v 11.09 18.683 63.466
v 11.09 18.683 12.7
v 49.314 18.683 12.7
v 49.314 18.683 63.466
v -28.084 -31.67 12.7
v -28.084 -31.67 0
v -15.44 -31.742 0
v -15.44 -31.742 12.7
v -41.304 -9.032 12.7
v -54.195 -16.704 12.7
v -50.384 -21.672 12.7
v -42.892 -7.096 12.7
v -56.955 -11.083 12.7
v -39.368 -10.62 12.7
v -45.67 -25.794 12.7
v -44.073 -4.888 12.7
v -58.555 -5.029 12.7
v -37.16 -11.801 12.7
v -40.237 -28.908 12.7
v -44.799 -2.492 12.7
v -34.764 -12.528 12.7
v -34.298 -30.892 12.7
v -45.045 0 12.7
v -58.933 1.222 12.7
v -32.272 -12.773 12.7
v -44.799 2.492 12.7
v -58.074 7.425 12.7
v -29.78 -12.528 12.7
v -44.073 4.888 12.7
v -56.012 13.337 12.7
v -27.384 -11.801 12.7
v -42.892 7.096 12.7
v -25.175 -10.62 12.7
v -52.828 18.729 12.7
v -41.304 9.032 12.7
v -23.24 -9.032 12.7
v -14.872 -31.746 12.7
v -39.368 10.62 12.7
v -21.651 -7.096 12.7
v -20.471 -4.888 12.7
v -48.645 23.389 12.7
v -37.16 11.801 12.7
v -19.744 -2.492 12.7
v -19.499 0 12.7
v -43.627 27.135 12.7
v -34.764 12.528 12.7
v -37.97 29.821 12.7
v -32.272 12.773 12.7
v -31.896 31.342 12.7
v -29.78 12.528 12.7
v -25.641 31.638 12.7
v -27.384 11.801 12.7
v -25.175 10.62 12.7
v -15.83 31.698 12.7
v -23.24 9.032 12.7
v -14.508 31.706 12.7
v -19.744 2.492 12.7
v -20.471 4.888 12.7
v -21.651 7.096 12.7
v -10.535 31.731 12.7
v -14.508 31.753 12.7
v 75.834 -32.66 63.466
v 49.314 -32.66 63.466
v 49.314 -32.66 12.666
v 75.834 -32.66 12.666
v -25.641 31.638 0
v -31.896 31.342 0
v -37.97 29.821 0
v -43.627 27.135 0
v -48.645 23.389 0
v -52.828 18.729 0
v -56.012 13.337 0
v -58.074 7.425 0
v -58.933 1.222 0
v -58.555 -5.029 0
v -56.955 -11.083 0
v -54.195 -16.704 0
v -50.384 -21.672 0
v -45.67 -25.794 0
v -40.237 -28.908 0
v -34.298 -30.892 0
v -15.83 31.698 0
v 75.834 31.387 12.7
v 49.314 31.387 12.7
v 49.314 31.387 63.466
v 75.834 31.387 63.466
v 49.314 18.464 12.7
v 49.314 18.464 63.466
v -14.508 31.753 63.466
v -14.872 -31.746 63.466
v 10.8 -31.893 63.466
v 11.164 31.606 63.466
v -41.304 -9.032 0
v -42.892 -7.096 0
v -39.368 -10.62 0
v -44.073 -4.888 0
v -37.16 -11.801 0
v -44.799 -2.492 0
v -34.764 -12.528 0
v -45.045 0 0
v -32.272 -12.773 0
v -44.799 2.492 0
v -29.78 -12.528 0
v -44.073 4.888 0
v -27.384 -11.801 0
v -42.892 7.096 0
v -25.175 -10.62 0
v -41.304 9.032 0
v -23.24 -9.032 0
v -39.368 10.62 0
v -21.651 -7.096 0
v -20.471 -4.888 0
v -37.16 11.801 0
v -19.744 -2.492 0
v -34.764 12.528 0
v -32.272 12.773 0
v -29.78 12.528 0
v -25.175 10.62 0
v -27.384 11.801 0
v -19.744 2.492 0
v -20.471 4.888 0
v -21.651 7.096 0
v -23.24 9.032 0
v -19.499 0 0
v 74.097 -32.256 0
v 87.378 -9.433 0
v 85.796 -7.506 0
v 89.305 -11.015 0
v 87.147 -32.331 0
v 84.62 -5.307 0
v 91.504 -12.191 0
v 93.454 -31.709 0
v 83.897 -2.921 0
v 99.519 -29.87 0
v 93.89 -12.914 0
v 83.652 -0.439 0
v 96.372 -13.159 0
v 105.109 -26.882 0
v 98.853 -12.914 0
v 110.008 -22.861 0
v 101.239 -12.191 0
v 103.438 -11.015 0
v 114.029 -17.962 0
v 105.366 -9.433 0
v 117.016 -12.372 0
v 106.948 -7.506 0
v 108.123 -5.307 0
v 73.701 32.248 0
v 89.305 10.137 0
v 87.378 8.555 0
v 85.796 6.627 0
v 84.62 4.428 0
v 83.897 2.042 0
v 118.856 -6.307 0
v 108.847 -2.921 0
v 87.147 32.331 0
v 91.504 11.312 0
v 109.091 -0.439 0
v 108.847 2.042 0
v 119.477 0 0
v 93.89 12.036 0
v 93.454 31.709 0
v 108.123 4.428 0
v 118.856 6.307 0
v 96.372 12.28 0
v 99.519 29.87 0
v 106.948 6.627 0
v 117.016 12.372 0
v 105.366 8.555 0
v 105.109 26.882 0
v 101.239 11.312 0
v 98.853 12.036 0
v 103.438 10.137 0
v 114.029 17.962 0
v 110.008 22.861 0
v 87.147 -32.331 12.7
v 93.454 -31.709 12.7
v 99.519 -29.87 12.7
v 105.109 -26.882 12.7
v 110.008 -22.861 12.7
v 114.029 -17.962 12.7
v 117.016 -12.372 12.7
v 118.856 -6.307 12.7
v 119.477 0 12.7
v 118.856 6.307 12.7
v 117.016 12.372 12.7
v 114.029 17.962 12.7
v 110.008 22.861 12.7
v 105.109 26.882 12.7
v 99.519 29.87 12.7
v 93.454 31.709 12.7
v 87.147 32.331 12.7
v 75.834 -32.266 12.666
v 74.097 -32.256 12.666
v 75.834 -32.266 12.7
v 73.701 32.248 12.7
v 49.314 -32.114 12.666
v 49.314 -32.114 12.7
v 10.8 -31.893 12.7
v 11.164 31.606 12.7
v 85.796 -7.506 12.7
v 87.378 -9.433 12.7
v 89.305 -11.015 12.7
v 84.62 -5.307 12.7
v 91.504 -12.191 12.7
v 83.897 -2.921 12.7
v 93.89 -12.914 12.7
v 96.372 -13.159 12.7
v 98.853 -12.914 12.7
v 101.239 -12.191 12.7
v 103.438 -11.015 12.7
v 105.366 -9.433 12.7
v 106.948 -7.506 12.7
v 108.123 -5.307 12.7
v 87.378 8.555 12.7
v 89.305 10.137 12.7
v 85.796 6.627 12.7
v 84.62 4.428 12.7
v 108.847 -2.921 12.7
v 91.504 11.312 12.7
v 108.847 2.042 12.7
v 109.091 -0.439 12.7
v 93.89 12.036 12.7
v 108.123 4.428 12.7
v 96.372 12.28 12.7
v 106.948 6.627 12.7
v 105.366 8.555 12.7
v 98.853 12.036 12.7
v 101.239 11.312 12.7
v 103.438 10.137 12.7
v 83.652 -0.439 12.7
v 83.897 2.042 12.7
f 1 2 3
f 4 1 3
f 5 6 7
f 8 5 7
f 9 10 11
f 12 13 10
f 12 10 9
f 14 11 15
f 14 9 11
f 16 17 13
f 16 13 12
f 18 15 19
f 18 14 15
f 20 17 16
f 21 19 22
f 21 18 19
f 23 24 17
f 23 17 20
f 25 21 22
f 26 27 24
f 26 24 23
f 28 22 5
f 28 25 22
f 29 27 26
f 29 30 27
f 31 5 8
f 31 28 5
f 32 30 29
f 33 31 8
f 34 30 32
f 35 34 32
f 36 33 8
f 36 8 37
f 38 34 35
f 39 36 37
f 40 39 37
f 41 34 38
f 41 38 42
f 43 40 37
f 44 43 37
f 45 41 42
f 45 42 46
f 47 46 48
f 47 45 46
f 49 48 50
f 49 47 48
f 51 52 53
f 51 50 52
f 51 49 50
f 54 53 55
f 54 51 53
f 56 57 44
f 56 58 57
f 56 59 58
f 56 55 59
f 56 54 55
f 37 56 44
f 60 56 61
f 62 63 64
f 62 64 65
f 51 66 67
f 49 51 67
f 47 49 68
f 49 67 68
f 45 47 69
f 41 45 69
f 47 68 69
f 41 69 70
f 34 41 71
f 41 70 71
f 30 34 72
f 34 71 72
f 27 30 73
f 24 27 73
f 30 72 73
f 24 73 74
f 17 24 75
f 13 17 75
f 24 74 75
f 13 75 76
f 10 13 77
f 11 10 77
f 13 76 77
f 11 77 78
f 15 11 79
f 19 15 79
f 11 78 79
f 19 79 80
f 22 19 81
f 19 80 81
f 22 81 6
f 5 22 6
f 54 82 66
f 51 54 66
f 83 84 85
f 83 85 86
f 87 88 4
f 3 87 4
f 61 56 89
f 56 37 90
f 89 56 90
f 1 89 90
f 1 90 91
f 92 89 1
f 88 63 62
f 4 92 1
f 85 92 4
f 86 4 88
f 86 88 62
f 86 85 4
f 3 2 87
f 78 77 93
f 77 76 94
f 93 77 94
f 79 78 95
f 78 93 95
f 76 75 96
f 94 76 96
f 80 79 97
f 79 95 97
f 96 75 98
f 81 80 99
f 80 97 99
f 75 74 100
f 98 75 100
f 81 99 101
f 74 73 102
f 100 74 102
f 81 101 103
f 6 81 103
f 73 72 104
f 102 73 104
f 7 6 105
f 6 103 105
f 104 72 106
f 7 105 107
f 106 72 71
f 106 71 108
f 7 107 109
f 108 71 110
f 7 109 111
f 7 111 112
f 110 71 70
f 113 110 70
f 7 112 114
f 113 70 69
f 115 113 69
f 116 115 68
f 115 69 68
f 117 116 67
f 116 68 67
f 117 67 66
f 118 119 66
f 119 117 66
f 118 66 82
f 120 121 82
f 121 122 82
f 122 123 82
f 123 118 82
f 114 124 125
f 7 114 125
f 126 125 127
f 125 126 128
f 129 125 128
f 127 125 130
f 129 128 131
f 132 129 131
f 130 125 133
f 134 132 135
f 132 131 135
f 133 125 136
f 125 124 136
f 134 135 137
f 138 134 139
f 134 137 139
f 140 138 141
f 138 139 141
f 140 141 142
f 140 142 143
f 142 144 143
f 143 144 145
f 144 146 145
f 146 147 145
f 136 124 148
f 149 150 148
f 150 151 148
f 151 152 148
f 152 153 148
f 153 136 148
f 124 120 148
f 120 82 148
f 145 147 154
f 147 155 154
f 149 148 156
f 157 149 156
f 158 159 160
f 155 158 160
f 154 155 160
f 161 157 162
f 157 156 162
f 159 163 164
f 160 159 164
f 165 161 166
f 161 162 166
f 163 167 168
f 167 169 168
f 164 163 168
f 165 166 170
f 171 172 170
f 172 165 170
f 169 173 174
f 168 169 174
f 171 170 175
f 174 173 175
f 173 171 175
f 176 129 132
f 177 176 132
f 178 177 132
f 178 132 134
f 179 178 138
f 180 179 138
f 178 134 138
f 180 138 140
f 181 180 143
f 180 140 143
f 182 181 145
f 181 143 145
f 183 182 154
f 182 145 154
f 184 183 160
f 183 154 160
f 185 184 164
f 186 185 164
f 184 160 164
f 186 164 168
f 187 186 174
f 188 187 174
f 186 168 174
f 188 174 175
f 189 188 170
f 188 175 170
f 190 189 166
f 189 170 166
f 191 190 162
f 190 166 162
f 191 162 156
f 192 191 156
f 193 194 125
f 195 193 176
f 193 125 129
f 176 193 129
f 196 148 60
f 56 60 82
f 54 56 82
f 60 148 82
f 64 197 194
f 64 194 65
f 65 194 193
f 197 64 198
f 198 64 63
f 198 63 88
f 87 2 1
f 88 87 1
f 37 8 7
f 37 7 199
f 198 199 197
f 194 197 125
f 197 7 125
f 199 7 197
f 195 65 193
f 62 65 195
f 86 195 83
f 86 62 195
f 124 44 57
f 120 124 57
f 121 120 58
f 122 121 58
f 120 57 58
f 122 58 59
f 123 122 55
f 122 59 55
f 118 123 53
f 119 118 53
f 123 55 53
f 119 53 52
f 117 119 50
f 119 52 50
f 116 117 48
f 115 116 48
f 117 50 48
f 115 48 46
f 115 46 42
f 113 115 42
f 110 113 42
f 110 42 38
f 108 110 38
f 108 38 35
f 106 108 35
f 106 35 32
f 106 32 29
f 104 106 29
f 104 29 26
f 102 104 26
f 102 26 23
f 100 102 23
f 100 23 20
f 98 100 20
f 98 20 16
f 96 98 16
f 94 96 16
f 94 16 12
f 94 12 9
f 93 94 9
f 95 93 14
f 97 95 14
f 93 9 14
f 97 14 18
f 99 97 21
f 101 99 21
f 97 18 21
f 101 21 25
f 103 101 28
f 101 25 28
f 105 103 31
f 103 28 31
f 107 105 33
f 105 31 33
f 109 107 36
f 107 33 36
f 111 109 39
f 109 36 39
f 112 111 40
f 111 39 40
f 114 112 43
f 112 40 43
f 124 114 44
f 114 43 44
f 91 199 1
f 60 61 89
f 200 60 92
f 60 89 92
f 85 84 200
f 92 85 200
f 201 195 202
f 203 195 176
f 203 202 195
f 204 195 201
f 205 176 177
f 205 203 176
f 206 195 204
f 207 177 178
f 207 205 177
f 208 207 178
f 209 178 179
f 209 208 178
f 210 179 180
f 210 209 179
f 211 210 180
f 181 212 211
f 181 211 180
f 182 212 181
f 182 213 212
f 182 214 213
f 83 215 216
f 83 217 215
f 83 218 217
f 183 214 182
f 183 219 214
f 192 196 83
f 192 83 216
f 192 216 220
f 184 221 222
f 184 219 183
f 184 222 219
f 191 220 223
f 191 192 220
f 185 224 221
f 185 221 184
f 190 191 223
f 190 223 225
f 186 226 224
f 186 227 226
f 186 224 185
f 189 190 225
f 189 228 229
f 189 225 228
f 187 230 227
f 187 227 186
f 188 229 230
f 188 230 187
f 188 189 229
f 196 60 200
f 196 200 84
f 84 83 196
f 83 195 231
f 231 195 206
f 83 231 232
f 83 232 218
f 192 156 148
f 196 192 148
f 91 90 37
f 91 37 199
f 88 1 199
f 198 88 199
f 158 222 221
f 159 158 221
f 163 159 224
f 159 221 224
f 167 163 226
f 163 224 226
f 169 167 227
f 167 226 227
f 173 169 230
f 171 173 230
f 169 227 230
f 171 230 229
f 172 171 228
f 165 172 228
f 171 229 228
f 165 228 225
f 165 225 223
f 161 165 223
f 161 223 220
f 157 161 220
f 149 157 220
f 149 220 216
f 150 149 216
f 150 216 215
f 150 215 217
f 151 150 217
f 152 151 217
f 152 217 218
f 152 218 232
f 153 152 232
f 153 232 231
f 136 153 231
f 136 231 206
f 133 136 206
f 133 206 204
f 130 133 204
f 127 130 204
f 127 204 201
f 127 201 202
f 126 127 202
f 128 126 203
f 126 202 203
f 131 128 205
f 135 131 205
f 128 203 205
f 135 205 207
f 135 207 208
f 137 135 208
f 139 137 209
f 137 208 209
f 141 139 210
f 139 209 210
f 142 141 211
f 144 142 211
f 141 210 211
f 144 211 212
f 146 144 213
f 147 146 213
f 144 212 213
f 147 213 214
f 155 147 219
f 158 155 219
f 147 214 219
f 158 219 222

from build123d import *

# Parameters (mm, degrees)
F1_DEPTH  = 12.7
F2_W      = 25.6720799953
F2_H      = 50.7660422802
F3_DEPTH  = 63.5
F5_DEPTH  = 50.7660422802
F6_W      = 26.5199552193
F6_H      = 64.0474567351
F7_DEPTH  = 50.8
F10_R     = 12.7730811137
F11_DEPTH = 63.4670422802
F12_R     = 12.7195807683
F13_DEPTH = 12.701


with BuildPart() as f1:
    # F0 (on Top) → F1 (new body)
    with BuildSketch(Plane.XY):
        with BuildLine():
            ThreePointArc((-25.6409262814, 31.6378357737), (-58.9331206672, 1.2217878444), (-28.0842930079, -31.6697917879))
            Line((-28.0842930079, -31.6697917879), (-15.4401324445, -31.7423005202))
            Line((-15.4401324445, -31.7423005202), (-15.8297911107, 31.6980969637))
            Line((-15.8297911107, 31.6980969637), (-25.6409262814, 31.6378357737))
        make_face()
        with BuildLine():
            Line((87.1467143297, 32.3305912316), (73.7005600104, 32.2480033102))
            Line((73.7005600104, 32.2480033102), (74.0967499711, -32.2557553919))
            Line((74.0967499711, -32.2557553919), (87.1467143297, -32.3305912316))
            ThreePointArc((87.1467143297, -32.3305912316), (119.4773055613, 0), (87.1467143297, 32.3305912316))
        make_face()
        Polygon((-15.8297911107, 31.6980969637), (-15.4401324445, -31.7423005202), (10.3389963129, -31.890132552), (74.0967499711, -32.2557553919), (73.7005600104, 32.2480033102), align=None)
    extrude(amount=F1_DEPTH)

    # F2 (on face) → F3 (join)
    with BuildSketch(Plane(origin=(-0.182529964, -31.8297961992, 0), x_dir=(0.9999835578, -0.0057344685, 0), z_dir=(-0.0057344685, -0.9999835578, 0))):
        with Locations((-1.8538236618, 38.0830211401)):
            Rectangle(F2_W, F2_H)
    extrude(amount=-F3_DEPTH)

    # F4 (on face) → F5 (join, through all)
    with BuildSketch(Plane.XY.offset(63.4660422802)):
        Polygon((49.3144159303, 31.3874045549), (11.1636445481, 31.6061825478), (11.0895372501, 18.6832621694), (49.3144159303, 18.6832621694), align=None)
    extrude(amount=-F5_DEPTH)

    # F6 (on face) → F7 (join)
    with BuildSketch(Plane.XY.offset(63.4660422802)):
        with Locations((62.5743935399, -0.6363238127)):
            Rectangle(F6_W, F6_H)
    extrude(amount=-F7_DEPTH)

    # F8 (on face) → F9 (join, up to the next surface of F1)
    with BuildSketch(Plane(origin=(10.982035764, -0.0629771733, 0), x_dir=(0.0057344685, 0.9999835578, 0), z_dir=(0.9999835578, -0.0057344685, 0))):
        Polygon((18.7465475772, 12.6999999999), (18.7465475772, 63.4660422802), (-31.8303195597, 12.7), align=None)
    extrude(until=Until.NEXT)

    # F10 (on face) → F11 (cut, through all)
    with BuildSketch(Plane.XY.offset(63.4660422802)):
        with Locations((-32.2718322277, 0)):
            Circle(F10_R)
    extrude(amount=-F11_DEPTH, mode=Mode.SUBTRACT)

    # F12 (on face) → F13 (cut, through all)
    with BuildSketch(Plane.XY.offset(12.7)):
        with Locations((96.3716953993, -0.4391576674)):
            Circle(F12_R)
    extrude(amount=-F13_DEPTH, mode=Mode.SUBTRACT)


solid = f1.part
